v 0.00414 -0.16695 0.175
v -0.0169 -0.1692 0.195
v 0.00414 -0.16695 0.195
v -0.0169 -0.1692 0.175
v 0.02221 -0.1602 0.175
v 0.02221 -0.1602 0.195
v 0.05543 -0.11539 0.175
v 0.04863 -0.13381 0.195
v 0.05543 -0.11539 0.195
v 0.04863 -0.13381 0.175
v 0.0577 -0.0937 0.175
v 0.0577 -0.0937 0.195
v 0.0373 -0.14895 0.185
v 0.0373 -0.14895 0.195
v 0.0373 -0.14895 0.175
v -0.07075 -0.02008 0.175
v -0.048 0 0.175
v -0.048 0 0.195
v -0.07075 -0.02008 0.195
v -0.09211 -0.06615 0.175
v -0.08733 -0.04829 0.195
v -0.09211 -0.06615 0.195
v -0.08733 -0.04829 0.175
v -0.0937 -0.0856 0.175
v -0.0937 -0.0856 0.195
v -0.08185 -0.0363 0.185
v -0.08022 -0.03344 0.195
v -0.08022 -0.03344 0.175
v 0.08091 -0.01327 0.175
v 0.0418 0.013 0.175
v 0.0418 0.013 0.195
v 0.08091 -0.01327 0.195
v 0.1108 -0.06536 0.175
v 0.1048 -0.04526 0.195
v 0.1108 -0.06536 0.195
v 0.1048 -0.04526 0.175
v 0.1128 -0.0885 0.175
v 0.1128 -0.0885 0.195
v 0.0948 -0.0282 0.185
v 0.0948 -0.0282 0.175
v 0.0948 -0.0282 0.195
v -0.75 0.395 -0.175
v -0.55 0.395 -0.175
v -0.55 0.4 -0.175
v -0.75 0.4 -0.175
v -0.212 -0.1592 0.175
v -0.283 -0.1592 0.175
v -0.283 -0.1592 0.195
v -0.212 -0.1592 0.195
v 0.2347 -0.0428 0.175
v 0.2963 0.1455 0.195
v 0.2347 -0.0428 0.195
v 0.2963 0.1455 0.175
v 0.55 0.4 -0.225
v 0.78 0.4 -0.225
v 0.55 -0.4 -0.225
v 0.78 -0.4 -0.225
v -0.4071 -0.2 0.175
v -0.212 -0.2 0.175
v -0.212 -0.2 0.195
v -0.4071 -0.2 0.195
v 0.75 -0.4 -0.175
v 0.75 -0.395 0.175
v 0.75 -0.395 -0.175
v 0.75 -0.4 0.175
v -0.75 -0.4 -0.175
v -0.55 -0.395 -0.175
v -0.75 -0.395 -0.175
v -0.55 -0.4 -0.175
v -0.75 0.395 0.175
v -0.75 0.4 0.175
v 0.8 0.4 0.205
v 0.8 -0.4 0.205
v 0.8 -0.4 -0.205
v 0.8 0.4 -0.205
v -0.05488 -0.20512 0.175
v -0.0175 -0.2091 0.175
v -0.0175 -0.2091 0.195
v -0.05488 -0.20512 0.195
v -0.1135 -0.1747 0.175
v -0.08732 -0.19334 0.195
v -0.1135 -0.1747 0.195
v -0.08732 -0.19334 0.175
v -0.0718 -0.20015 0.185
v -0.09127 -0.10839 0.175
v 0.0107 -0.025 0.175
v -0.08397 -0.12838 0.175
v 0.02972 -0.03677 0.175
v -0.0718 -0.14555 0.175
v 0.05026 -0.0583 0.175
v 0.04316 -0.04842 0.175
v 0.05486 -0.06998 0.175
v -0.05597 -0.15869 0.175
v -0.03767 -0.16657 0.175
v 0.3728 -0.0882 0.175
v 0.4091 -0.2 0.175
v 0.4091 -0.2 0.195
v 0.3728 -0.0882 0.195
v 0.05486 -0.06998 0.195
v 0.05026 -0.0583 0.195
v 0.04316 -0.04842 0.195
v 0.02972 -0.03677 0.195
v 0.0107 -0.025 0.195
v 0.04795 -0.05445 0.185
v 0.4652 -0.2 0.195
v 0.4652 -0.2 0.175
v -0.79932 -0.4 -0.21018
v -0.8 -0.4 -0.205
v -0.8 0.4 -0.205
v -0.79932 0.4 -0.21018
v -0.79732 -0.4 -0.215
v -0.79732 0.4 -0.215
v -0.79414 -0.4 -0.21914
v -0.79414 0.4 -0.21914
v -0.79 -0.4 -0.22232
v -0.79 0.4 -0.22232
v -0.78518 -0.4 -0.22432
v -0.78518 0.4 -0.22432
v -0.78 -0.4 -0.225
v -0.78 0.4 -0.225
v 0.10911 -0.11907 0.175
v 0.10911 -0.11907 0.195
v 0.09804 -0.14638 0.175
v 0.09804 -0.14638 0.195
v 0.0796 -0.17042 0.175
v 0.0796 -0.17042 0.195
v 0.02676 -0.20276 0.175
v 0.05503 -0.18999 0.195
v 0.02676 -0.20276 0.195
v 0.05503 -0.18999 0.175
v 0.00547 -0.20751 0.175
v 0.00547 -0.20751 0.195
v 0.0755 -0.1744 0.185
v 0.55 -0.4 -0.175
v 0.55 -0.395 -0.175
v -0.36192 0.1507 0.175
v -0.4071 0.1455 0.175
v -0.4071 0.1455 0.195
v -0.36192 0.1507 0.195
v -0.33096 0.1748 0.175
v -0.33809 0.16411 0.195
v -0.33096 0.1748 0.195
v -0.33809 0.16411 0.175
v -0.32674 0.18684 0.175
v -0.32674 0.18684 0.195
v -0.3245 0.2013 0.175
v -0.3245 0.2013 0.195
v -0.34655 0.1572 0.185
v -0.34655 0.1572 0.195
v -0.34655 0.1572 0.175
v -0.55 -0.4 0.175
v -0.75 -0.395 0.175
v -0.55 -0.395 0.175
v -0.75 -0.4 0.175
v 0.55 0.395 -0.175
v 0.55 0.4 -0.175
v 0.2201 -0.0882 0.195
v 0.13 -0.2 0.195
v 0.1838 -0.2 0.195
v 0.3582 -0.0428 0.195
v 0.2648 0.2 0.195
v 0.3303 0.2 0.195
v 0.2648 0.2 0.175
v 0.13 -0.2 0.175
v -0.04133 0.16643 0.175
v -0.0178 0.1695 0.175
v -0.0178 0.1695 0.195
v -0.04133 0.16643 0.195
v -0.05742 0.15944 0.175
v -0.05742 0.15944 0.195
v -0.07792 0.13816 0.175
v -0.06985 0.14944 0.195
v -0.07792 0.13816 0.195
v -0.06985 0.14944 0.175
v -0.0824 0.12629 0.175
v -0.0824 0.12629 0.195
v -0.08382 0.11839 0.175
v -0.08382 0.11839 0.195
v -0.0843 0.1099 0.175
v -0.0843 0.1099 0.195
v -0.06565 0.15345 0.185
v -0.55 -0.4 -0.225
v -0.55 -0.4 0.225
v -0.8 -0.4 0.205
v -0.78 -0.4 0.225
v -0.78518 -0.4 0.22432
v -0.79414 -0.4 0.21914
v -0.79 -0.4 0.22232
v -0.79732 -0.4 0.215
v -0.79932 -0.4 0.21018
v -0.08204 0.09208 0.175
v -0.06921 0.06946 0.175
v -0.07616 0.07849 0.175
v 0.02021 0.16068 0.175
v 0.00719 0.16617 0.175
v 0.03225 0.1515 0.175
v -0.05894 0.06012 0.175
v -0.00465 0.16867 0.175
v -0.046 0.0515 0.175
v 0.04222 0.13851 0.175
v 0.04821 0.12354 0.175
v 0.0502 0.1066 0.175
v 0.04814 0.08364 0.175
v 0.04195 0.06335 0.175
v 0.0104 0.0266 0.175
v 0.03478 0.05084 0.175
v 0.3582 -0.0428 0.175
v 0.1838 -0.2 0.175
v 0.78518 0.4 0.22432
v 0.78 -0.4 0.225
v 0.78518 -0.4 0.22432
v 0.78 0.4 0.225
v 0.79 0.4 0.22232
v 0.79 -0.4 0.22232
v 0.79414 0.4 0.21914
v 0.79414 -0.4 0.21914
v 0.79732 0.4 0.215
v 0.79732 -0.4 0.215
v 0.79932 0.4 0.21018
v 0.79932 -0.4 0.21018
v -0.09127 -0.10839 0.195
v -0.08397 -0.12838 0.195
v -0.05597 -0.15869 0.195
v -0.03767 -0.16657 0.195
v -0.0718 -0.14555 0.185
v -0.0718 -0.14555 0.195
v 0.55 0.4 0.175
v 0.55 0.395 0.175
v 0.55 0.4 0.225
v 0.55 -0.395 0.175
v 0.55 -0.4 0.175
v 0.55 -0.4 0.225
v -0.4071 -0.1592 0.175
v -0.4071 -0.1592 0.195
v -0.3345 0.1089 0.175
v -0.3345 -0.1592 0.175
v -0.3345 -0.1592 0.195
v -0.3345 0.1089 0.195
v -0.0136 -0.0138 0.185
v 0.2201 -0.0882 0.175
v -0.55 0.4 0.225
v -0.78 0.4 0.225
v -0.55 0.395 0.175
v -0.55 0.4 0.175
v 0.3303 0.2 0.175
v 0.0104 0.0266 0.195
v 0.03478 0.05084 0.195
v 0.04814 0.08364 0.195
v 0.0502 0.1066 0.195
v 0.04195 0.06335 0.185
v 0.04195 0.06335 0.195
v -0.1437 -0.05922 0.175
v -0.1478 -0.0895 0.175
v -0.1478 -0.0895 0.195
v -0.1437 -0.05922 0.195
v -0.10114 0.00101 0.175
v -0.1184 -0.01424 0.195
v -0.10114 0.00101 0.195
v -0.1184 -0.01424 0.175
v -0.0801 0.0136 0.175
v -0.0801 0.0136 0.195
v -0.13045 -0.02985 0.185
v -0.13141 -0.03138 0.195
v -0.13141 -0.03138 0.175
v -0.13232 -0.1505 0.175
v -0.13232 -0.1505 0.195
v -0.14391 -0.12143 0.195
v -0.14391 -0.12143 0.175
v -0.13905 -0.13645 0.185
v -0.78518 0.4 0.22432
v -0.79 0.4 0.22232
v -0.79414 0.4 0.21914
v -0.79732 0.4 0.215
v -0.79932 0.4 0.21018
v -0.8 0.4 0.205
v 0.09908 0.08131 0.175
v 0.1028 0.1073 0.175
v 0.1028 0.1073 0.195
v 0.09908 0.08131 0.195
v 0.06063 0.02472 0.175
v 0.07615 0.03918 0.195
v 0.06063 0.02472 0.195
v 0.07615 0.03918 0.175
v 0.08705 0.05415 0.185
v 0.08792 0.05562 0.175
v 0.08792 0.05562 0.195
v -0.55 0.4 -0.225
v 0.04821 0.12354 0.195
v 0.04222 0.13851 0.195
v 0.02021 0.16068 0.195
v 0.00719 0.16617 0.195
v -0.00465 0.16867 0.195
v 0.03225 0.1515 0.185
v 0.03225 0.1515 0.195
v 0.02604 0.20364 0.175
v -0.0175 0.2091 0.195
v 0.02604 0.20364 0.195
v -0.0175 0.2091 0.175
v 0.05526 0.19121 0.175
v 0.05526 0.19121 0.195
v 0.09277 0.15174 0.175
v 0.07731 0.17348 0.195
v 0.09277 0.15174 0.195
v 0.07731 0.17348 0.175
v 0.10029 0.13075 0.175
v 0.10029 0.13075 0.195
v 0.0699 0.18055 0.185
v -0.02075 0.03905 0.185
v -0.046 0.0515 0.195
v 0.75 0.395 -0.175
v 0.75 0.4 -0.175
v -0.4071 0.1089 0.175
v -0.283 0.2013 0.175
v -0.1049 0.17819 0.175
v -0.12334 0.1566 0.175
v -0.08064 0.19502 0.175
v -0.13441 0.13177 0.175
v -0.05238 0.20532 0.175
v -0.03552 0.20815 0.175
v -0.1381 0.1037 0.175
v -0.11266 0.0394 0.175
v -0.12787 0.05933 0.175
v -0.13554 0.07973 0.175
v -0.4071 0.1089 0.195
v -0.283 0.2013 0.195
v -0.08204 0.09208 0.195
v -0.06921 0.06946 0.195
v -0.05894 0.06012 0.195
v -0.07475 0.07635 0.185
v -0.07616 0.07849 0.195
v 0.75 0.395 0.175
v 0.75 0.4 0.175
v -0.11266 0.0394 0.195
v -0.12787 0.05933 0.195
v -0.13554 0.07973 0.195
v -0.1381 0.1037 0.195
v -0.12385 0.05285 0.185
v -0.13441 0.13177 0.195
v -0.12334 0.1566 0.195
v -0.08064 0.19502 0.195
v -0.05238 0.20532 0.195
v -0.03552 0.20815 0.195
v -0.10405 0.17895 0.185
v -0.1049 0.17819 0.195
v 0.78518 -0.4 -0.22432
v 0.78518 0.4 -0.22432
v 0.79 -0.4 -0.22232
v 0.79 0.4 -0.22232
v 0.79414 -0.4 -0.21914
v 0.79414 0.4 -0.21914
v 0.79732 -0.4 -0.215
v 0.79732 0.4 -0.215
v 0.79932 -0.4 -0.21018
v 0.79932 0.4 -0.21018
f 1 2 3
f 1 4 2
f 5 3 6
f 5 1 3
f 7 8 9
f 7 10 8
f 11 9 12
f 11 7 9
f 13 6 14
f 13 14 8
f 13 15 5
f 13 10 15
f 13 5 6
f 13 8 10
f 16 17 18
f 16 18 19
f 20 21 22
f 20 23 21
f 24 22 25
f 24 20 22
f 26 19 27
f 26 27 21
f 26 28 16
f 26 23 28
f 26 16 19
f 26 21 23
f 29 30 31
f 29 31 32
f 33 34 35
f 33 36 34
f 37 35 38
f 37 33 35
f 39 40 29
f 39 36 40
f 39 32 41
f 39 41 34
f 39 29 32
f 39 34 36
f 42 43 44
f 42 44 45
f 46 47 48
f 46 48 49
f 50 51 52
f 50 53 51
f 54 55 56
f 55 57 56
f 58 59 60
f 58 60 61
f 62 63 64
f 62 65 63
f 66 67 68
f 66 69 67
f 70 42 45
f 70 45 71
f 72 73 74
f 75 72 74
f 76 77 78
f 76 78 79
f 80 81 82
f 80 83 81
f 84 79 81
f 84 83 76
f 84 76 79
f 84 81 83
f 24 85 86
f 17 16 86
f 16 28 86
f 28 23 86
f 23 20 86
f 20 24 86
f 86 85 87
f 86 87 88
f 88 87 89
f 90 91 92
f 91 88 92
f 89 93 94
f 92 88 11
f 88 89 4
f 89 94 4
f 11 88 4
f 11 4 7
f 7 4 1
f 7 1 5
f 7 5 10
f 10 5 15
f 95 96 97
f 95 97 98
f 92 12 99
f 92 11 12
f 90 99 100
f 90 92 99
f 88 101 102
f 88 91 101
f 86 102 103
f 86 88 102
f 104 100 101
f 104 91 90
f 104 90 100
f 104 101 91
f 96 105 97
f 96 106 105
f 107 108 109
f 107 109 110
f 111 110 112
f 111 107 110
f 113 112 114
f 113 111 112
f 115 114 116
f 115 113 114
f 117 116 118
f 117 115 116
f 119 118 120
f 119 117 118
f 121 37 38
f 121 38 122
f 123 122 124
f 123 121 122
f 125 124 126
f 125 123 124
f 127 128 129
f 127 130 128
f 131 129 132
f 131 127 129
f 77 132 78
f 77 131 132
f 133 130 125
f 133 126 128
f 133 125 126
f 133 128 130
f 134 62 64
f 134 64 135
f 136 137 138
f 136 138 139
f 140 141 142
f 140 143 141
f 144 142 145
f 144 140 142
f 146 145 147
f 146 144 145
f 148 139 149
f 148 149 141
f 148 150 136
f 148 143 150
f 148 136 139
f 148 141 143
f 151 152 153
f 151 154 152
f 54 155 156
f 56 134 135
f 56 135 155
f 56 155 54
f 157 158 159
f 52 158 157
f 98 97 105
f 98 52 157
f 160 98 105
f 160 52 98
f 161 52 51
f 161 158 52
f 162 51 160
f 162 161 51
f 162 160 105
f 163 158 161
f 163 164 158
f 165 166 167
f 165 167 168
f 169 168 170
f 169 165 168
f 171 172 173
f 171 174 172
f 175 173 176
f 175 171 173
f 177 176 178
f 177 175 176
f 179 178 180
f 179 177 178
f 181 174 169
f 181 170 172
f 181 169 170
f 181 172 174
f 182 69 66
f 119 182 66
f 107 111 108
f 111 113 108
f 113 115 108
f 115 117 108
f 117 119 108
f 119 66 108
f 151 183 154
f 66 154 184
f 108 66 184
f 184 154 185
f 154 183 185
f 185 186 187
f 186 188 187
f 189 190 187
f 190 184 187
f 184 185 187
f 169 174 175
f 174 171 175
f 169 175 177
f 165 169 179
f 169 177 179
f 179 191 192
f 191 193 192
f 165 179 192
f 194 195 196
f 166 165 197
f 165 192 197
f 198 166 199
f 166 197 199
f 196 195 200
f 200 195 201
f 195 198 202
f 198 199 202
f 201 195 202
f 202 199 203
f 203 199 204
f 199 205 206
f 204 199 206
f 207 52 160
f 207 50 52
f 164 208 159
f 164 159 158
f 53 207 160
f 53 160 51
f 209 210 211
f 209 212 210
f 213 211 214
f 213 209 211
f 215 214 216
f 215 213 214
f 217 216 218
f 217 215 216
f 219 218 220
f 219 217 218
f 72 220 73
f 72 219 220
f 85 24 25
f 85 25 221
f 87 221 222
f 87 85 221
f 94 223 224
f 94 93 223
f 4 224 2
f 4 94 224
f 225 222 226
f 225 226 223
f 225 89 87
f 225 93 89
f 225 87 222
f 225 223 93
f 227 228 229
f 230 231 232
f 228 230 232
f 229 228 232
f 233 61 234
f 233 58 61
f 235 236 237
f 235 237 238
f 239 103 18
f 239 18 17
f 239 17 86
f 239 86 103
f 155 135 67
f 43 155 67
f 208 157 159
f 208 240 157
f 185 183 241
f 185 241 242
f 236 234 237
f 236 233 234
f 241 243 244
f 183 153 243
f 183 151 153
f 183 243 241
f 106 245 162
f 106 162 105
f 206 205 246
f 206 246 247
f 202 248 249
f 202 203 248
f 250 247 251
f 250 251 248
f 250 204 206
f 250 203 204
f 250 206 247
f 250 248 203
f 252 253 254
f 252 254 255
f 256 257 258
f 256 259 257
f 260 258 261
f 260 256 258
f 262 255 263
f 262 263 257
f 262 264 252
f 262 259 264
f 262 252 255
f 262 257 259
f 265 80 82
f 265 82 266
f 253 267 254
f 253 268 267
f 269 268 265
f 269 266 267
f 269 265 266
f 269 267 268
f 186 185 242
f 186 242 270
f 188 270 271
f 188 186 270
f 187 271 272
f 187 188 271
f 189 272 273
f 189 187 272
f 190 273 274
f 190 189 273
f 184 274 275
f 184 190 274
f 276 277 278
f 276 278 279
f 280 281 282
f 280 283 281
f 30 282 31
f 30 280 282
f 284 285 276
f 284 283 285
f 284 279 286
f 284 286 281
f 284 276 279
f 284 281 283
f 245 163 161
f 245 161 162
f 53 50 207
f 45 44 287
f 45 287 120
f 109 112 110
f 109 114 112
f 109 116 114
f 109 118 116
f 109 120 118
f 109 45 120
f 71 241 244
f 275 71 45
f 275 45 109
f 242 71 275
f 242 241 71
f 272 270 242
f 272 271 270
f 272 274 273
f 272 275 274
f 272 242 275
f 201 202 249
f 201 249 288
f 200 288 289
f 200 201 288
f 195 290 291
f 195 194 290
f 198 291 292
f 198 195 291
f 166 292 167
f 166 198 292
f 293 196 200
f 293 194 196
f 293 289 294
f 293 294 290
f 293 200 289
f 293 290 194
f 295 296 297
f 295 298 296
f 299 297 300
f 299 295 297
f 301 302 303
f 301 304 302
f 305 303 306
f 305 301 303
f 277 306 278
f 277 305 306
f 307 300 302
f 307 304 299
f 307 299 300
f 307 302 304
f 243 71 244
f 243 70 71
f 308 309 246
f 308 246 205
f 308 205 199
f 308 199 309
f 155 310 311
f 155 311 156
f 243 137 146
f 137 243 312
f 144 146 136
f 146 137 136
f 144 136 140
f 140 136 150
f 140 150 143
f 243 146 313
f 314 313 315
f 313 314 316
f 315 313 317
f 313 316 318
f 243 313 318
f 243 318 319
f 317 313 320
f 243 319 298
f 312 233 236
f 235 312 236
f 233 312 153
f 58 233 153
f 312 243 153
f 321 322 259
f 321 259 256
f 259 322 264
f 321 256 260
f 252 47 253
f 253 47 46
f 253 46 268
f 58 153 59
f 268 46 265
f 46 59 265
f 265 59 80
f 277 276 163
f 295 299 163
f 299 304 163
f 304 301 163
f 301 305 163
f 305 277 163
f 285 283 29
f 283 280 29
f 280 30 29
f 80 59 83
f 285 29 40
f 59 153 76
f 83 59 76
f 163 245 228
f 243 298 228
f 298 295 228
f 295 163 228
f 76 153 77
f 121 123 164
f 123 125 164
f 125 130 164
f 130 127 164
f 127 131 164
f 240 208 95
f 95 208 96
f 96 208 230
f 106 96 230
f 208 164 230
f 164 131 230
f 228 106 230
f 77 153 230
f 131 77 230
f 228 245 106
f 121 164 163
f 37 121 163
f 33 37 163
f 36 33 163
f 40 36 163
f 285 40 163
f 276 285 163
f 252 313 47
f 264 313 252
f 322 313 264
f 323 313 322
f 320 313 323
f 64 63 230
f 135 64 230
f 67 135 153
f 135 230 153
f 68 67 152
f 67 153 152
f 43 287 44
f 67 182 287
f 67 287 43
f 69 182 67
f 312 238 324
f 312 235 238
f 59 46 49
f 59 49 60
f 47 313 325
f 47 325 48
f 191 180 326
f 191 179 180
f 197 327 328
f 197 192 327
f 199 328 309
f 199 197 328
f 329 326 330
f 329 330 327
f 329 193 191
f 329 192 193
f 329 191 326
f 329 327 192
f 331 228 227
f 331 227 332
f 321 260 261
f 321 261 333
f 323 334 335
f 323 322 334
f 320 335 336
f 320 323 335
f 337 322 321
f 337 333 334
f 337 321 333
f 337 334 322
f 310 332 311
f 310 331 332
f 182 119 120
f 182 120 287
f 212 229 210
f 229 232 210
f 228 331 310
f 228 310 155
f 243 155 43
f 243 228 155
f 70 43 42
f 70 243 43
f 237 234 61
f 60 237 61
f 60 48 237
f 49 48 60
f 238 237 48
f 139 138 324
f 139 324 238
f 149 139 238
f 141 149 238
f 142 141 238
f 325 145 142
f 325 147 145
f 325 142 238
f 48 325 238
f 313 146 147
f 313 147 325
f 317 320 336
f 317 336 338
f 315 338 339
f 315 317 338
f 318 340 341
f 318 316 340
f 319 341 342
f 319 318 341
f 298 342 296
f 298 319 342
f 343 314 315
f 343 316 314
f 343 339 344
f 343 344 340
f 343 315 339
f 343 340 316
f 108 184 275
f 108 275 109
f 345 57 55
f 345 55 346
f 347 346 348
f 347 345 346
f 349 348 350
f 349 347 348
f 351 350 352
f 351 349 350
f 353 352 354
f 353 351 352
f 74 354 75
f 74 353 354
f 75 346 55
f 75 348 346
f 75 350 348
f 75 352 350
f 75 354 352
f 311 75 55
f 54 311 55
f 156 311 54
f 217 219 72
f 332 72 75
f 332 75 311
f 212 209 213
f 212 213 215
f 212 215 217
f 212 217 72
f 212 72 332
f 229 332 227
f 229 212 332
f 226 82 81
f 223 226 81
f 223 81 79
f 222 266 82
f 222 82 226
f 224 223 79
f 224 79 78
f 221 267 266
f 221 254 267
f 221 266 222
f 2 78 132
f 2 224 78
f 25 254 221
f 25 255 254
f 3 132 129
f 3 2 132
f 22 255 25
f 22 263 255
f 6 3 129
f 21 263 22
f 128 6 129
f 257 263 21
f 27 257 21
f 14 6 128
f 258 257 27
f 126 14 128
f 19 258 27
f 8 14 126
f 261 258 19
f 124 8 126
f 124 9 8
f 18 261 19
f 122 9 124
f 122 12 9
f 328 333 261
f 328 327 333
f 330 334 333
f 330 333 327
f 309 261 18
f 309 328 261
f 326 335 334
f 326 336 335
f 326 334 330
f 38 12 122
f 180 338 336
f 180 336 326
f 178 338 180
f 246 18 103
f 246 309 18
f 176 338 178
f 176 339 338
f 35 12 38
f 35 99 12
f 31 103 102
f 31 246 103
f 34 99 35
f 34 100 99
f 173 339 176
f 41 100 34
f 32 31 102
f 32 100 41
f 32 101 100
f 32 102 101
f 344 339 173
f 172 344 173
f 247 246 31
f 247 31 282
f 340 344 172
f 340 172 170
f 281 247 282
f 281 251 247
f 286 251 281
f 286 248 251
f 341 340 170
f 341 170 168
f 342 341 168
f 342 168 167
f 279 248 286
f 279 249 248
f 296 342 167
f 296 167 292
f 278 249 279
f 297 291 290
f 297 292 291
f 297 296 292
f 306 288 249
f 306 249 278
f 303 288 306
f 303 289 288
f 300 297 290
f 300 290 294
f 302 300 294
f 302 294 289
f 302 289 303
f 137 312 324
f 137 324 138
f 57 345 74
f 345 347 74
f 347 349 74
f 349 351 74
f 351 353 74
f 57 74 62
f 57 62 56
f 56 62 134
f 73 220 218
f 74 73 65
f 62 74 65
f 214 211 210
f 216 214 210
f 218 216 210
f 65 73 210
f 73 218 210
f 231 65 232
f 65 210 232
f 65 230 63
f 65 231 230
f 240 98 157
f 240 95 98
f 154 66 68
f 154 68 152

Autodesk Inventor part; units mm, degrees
ref_plane "YZ Plane" through (0, 0, 0) normal (1, 0, 0) x (0, 1, 0)
ref_plane "XZ Plane" through (0, 0, 0) normal (0, 1, 0) x (-1, 0, 0)
ref_plane "XY Plane" through (0, 0, 0) normal (0, 0, 1) x (1, 0, 0)
sketch "Sketch1" plane through (0, 0, 0) normal (0, 1, 0) x (-1, 0, 0)
  line L0 (0.75, 0.175) -> (-0.75, 0.175)
  line L1 (-0.75, 0.175) -> (-0.75, -0.175)
  line L2 (-0.75, -0.175) -> (0.75, -0.175)
  line L3 (0.75, -0.175) -> (0.75, 0.175)
  line L4 (0.55, 0.175) -> (0.55, 0.225)
  line L5 (0.55, 0.225) -> (0.8, 0.225)
  line L6 (0.8, 0.225) -> (0.8, -0.225)
  line L7 (0.8, -0.225) -> (0.55, -0.225)
  line L8 (0.55, -0.225) -> (0.55, -0.175)
  line L9 (-0.55, 0.175) -> (-0.55, 0.225)
  line L10 (-0.55, 0.225) -> (-0.8, 0.225)
  line L11 (-0.8, 0.225) -> (-0.8, -0.225)
  line L12 (-0.8, -0.225) -> (-0.55, -0.225)
  line L13 (-0.55, -0.175) -> (-0.55, -0.225)
  line L14 (0.55, 0.175) -> (-0.55, 0.175)
  point P0 (0, 0)
  point P1 (0, 0.175)
  point P2 (0.75, 0)
  dimension "d0" = 1.6
  dimension "d1" = 0.05
  dimension "d2" = 0.05
  dimension "d3" = 0.45
  dimension "d4" = 0.25
extrude "Extrusion1" add sketch "Sketch1" along normal mid plane 0.8 contours L0 L4 L5 L6 L7 L8 L2 L3 | L0 L1 L2 L13 L12 L11 L10 L9
extrude "Extrusion2" add sketch "Sketch1" along normal mid plane 0.79 contours L3 L2 L1 L0
sketch "Sketch2" plane through (-0.55, -0.395, 0.175) normal (0, 0, 1) x (1, 0, 0)
  line L0 (0, 0) -> (0, 0.79) projected
  line L1 (1.1, 0) -> (0, 0) projected
  line L2 (1.1, 0) -> (1.1, 0.79) projected
  line L3 (0, 0.79) -> (1.1, 0.79) projected
  line L4 (0, 0.395) -> (1.1, 0.395) construction
  line L5 (0.338, 0.195) -> (0.1429, 0.195)
  line L6 (0.1429, 0.195) -> (0.1429, 0.2358)
  line L7 (0.1429, 0.2358) -> (0.2155, 0.2358)
  line L8 (0.2155, 0.2358) -> (0.2155, 0.5039)
  line L9 (0.2155, 0.5039) -> (0.1429, 0.5039)
  line L10 (0.1429, 0.5039) -> (0.1429, 0.5405)
  spline S0 degree 2 poles (0.1429, 0.5405) (0.184, 0.5405) (0.2229, 0.5639) (0.2255, 0.5963) knots 0 0 0 1 2 2 2
  line L11 (0.2255, 0.5963) -> (0.267, 0.5963)
  line L12 (0.267, 0.5963) -> (0.267, 0.2358)
  line L13 (0.267, 0.2358) -> (0.338, 0.2358)
  line L14 (0.338, 0.2358) -> (0.338, 0.195)
  spline S1 degree 2 poles (0.5325, 0.1859) (0.5027, 0.1859) (0.4537, 0.2038) (0.4365, 0.2203) knots 0 0 0 1 2 2 2
  spline S2 degree 2 poles (0.4365, 0.2203) (0.4197, 0.2365) (0.4022, 0.2806) (0.4022, 0.3055) knots 0 0 0 1 2 2 2
  spline S3 degree 2 poles (0.4022, 0.3055) (0.4022, 0.3379) (0.4369, 0.3924) (0.4699, 0.4086) knots 0 0 0 1 2 2 2
  line L15 (0.4699, 0.4086) -> (0.4699, 0.4102)
  spline S4 degree 2 poles (0.4699, 0.4102) (0.4404, 0.4274) (0.4119, 0.4683) (0.4119, 0.4987) knots 0 0 0 1 2 2 2
  spline S5 degree 2 poles (0.4119, 0.4987) (0.4119, 0.5438) (0.48, 0.6041) (0.5325, 0.6041) knots 0 0 0 1 2 2 2
  spline S6 degree 2 poles (0.5325, 0.6041) (0.587, 0.6041) (0.6528, 0.547) (0.6528, 0.5023) knots 0 0 0 1 2 2 2
  spline S7 degree 2 poles (0.6528, 0.5023) (0.6528, 0.4754) (0.6213, 0.4229) (0.5918, 0.408) knots 0 0 0 1 2 2 2
  line L16 (0.5918, 0.408) -> (0.5918, 0.4063)
  spline S8 degree 2 poles (0.5918, 0.4063) (0.6268, 0.3901) (0.6628, 0.3435) (0.6628, 0.3065) knots 0 0 0 1 2 2 2
  spline S9 degree 2 poles (0.6628, 0.3065) (0.6628, 0.2553) (0.5882, 0.1859) (0.5325, 0.1859) knots 0 0 0 1 2 2 2
  spline S10 degree 2 poles (0.6077, 0.3013) (0.6077, 0.326) (0.5882, 0.3551) (0.5607, 0.37) knots 0 0 0 1 2 2 2
  spline S11 degree 2 poles (0.5607, 0.37) (0.5516, 0.3752) (0.5212, 0.3872) (0.502, 0.395) knots 0 0 0 1 2 2 2
  spline S12 degree 2 poles (0.502, 0.395) (0.48, 0.3804) (0.4563, 0.337) (0.4563, 0.3094) knots 0 0 0 1 2 2 2
  spline S13 degree 2 poles (0.4563, 0.3094) (0.4563, 0.2731) (0.5001, 0.2258) (0.5331, 0.2258) knots 0 0 0 1 2 2 2
  spline S14 degree 2 poles (0.5331, 0.2258) (0.5669, 0.2258) (0.6077, 0.2663) (0.6077, 0.3013) knots 0 0 0 1 2 2 2
  spline S15 degree 2 poles (0.6002, 0.5016) (0.6002, 0.5285) (0.5643, 0.5645) (0.5322, 0.5645) knots 0 0 0 1 2 2 2
  spline S16 degree 2 poles (0.5322, 0.5645) (0.503, 0.5645) (0.4657, 0.5324) (0.4657, 0.5049) knots 0 0 0 1 2 2 2
  spline S17 degree 2 poles (0.4657, 0.5049) (0.4657, 0.4851) (0.4848, 0.4576) (0.504, 0.4465) knots 0 0 0 1 2 2 2
  spline S18 degree 2 poles (0.504, 0.4465) (0.5121, 0.442) (0.5464, 0.4261) (0.5604, 0.4216) knots 0 0 0 1 2 2 2
  spline S19 degree 2 poles (0.5604, 0.4216) (0.5837, 0.4394) (0.6002, 0.4773) (0.6002, 0.5016) knots 0 0 0 1 2 2 2
  line L17 (0.68, 0.195) -> (0.8148, 0.595)
  line L18 (0.8148, 0.595) -> (0.8803, 0.595)
  line L19 (0.8803, 0.595) -> (1.0152, 0.195)
  line L20 (1.0152, 0.195) -> (0.9591, 0.195)
  line L21 (0.9591, 0.195) -> (0.9228, 0.3068)
  line L22 (0.9228, 0.3068) -> (0.7701, 0.3068)
  line L23 (0.7701, 0.3068) -> (0.7338, 0.195)
  line L24 (0.7338, 0.195) -> (0.68, 0.195)
  line L25 (0.9082, 0.3522) -> (0.8463, 0.5405)
  line L26 (0.8463, 0.5405) -> (0.7847, 0.3522)
  line L27 (0.7847, 0.3522) -> (0.9082, 0.3522)
  point P0 (0.55, 0.395)
extrude "Extrusion3" add sketch "Sketch2" along normal blind 0.02 contours L5 L6 L7 L8 L9 L10 S0 L11 L12 L13 L14 | S1 S2 S3 S4 S5 S6 S7 S8 S9 | L17 L18 L19 L20 L21 L22 L23 L24
fillet "Fillet1" radius 0.02 4 edges at (-0.8, 0, 0.225) (-0.8, 0, -0.225) (0.8, 0, 0.225) (0.8, 0, -0.225)
equation "\"d2\" = d1"
properties part number "21-1001" material "Copper"
